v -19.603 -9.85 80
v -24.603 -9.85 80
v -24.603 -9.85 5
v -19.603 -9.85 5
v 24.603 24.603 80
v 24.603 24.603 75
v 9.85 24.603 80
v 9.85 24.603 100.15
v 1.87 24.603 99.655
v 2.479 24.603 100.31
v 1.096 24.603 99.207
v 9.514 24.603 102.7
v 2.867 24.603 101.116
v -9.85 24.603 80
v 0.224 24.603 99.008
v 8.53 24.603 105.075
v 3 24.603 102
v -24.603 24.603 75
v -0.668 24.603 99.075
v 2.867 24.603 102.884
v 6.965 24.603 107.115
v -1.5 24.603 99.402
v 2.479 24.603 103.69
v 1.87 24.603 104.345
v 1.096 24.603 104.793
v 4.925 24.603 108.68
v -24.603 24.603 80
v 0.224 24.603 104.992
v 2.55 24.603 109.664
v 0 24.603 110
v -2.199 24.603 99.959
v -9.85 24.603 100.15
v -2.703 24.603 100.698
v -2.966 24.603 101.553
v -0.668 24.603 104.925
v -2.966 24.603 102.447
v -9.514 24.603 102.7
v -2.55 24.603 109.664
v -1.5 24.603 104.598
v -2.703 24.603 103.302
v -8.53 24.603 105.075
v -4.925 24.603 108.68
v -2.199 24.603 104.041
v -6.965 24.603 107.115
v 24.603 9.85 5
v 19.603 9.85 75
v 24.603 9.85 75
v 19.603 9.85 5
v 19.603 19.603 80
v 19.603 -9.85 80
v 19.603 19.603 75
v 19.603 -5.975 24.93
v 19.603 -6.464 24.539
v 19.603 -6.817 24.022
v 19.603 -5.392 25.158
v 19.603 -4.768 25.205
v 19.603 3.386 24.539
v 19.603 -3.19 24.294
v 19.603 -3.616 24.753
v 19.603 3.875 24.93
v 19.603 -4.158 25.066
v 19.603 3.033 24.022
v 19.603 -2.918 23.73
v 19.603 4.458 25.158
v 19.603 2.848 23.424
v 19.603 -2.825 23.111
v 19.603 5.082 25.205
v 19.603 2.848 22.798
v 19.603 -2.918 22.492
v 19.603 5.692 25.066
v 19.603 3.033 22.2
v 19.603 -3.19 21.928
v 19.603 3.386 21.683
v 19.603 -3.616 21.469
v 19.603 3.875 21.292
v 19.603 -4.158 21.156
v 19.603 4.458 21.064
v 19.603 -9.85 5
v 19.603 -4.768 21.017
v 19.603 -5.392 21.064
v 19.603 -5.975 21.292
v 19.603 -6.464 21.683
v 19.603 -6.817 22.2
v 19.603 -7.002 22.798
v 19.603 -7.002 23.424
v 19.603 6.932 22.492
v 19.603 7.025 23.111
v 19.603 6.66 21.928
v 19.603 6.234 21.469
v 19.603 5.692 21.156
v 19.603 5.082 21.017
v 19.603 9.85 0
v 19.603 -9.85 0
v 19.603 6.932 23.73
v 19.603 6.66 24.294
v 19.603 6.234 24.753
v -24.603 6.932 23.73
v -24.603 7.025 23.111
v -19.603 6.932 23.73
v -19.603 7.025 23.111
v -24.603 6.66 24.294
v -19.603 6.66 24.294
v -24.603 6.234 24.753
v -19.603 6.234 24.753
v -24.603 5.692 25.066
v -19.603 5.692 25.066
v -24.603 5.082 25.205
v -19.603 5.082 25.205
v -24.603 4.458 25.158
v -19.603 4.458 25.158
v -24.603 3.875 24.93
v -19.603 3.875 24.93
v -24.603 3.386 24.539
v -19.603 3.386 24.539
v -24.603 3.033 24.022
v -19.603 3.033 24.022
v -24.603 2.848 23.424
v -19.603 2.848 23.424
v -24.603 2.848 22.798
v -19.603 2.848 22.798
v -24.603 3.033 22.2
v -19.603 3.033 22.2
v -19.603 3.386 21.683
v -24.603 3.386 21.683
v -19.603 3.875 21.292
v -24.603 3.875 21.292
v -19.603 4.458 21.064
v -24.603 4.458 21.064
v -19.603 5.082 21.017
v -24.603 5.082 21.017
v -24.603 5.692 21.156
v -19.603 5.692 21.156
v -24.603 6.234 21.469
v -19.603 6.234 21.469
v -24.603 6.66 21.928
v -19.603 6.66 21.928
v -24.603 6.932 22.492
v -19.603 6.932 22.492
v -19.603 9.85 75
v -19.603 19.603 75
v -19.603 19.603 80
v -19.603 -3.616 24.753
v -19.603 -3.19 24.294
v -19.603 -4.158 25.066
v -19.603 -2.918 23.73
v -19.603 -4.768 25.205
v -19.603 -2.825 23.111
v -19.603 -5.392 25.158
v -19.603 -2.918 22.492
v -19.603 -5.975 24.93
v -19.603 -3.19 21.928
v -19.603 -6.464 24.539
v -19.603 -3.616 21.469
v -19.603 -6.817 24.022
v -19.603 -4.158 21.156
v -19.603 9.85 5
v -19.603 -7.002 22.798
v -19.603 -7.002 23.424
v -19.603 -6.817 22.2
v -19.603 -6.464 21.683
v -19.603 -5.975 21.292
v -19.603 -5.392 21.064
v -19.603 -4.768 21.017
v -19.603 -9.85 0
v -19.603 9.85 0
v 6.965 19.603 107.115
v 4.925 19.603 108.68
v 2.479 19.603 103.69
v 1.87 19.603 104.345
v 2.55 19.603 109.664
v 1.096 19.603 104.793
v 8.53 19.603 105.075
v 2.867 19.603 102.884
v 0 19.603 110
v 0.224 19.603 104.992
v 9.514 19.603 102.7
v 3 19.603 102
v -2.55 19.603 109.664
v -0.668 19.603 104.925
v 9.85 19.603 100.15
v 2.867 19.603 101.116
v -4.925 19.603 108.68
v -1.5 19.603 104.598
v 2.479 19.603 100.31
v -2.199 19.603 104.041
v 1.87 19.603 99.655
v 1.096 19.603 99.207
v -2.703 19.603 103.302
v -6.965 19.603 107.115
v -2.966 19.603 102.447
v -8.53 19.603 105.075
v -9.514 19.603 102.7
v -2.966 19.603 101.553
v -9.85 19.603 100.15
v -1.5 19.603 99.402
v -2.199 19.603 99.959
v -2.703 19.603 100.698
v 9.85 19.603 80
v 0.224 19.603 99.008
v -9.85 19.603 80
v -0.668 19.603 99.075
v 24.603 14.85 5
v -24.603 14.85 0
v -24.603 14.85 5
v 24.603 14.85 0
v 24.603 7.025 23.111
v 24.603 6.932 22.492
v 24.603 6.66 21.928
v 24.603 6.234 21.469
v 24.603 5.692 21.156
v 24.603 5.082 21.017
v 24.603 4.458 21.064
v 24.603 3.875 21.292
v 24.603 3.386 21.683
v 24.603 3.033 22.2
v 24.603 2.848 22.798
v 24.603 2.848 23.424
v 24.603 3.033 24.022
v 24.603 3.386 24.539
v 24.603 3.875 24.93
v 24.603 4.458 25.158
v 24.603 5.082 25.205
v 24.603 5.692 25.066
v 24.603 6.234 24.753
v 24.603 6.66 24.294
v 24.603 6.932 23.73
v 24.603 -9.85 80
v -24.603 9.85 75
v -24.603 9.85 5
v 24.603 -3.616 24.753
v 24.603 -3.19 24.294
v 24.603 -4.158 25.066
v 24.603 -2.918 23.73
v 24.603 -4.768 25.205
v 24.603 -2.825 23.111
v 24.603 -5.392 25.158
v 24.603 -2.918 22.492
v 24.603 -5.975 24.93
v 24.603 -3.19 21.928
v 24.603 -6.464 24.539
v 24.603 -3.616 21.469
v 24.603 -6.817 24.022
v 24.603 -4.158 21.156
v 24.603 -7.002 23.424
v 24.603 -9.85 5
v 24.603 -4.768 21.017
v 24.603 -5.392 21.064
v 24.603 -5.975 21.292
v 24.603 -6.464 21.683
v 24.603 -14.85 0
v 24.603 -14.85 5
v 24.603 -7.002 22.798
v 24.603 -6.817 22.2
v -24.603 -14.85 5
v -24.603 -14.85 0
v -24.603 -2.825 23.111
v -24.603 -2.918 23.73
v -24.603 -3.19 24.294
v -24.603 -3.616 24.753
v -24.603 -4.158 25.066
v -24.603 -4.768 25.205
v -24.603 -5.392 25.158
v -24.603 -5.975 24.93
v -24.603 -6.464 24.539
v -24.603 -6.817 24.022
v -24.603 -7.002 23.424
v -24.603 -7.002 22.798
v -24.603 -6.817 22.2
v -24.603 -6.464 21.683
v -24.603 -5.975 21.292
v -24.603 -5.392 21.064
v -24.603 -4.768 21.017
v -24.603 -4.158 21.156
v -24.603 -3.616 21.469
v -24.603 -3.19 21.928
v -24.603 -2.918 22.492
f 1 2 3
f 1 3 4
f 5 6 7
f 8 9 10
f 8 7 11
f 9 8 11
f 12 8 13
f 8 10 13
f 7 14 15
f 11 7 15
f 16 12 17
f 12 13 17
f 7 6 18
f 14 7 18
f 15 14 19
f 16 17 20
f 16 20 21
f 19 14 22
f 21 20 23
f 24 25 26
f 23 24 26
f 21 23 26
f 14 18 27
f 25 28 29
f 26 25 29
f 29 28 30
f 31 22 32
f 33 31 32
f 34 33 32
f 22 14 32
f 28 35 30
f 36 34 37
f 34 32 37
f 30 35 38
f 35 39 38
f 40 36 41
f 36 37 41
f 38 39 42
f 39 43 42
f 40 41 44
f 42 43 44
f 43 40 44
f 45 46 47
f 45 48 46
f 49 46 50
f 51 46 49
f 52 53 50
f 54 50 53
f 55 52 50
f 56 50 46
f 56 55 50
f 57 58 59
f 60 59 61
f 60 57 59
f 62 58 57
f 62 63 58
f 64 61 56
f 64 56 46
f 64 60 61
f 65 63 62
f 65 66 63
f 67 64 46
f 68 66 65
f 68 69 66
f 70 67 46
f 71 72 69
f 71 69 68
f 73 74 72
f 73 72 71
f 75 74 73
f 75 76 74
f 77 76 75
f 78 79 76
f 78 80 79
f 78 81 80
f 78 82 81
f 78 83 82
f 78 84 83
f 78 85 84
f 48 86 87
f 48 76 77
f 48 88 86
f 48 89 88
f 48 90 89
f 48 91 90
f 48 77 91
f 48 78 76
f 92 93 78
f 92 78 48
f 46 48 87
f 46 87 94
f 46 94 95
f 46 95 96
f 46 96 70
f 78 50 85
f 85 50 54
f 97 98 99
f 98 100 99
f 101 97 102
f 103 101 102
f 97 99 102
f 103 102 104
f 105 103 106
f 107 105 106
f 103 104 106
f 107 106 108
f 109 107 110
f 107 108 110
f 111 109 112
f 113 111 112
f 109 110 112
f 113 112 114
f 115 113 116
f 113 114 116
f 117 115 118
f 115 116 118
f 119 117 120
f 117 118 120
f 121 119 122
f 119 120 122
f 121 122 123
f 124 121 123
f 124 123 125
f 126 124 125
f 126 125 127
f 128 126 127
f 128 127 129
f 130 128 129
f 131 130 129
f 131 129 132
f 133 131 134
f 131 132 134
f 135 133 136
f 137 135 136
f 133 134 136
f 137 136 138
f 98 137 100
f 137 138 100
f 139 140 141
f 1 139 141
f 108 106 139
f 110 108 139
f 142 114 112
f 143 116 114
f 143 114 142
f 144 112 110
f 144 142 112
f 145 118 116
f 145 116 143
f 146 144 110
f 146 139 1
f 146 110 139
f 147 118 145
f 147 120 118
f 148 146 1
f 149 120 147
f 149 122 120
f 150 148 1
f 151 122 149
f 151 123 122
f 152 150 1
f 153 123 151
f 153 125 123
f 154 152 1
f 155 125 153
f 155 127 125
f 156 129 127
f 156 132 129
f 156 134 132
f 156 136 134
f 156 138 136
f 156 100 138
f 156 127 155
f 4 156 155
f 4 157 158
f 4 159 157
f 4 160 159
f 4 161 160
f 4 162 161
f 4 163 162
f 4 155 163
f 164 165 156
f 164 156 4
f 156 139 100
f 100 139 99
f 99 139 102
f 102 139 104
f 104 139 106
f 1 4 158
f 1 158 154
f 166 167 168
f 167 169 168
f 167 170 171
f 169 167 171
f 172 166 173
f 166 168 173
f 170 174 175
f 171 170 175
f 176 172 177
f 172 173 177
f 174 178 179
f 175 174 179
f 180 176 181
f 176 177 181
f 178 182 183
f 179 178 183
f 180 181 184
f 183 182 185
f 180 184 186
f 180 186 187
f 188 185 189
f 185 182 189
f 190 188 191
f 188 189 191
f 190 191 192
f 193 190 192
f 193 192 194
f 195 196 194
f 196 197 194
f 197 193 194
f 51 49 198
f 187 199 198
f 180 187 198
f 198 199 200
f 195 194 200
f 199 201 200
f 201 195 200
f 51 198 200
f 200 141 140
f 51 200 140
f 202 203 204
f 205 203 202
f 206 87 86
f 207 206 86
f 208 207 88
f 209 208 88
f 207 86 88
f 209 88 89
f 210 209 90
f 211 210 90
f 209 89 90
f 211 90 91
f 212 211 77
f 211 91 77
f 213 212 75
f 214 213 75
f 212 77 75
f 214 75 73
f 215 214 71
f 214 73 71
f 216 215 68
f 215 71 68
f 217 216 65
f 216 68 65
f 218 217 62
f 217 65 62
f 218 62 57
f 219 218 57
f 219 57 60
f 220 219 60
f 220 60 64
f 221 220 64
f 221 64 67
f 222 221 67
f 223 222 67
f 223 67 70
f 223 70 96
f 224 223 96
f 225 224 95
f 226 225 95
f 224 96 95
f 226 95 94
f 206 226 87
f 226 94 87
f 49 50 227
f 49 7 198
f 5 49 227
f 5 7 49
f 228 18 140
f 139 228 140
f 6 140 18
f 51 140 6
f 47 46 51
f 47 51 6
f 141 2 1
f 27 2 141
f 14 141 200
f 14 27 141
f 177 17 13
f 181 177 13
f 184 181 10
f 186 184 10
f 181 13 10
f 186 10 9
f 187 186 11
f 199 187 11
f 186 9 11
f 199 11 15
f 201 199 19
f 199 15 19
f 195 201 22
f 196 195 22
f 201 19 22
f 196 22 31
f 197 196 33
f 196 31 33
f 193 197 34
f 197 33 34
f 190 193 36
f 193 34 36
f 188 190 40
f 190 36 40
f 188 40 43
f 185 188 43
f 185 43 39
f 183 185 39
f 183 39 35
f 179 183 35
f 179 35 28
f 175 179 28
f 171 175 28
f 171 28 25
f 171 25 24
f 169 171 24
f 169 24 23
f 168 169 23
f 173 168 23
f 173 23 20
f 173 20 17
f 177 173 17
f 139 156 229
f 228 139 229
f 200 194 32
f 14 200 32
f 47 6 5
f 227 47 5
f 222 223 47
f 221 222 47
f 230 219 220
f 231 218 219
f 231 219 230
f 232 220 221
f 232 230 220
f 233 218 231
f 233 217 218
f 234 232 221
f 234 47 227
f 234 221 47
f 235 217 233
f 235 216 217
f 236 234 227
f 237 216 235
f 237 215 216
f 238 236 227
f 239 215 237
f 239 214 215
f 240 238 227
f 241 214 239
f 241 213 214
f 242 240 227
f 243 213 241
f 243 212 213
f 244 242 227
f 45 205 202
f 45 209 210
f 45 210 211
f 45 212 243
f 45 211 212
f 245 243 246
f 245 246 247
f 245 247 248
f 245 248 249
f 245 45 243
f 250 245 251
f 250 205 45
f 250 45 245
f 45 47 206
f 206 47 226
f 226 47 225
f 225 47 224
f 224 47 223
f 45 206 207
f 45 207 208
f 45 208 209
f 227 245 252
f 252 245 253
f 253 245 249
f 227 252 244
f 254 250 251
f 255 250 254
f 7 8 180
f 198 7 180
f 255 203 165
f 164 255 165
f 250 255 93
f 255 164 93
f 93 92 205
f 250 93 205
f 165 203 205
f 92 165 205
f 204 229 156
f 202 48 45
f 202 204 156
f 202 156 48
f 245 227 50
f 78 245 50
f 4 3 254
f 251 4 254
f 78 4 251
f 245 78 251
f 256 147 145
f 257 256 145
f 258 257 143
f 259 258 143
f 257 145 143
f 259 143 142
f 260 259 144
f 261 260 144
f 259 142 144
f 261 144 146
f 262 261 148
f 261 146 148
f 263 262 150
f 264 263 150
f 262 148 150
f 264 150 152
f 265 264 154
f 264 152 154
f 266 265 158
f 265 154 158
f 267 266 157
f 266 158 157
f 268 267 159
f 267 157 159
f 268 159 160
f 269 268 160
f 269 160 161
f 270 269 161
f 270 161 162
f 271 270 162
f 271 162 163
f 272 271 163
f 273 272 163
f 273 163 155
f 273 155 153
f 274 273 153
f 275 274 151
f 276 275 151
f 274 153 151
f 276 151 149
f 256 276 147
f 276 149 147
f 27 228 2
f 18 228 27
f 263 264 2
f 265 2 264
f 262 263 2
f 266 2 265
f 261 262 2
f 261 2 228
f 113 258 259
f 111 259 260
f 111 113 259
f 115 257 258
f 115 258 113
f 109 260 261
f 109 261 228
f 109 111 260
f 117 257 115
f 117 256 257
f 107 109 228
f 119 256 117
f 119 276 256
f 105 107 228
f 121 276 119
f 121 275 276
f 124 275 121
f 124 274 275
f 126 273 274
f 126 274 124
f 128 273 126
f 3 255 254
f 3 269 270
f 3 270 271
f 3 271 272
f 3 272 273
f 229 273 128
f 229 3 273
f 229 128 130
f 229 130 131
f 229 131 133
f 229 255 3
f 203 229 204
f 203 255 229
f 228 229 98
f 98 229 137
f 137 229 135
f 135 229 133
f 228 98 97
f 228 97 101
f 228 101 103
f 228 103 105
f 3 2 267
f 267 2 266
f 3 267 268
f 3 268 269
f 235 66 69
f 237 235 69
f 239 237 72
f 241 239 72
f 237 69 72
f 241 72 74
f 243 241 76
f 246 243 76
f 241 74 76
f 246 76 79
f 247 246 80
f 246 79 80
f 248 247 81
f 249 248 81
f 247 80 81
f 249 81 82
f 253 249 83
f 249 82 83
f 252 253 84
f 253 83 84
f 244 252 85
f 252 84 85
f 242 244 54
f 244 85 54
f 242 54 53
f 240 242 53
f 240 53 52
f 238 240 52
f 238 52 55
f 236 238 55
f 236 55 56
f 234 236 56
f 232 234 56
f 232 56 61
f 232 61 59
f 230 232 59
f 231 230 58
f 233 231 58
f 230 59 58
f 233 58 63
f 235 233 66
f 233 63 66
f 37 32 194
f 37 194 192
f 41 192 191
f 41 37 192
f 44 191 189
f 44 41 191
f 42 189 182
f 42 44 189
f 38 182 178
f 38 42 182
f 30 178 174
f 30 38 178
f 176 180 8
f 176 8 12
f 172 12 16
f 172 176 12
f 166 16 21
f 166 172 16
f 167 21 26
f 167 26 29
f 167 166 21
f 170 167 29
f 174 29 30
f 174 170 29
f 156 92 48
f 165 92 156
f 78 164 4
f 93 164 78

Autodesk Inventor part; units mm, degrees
ref_plane "YZ Plane" through (0, 0, 0) normal (1, 0, 0) x (0, 1, 0)
ref_plane "XZ Plane" through (0, 0, 0) normal (0, 1, 0) x (-1, 0, 0)
ref_plane "XY Plane" through (0, 0, 0) normal (0, 0, 1) x (1, 0, 0)
sketch "Sketch1" plane through (0, 0, 0) normal (0, 0, 1) x (1, 0, 0)
  line L0 (-19.603, -9.85) -> (19.603, -9.85)
  line L1 (19.603, -9.85) -> (19.603, 9.85)
  line L2 (19.603, 9.85) -> (-19.603, 9.85)
  line L3 (-19.603, 9.85) -> (-19.603, -9.85)
  line L4 (-19.603, -9.85) -> (19.603, 9.85) construction
  line L5 (19.603, -9.85) -> (-19.603, 9.85) construction
  line L6 (-24.603, 14.85) -> (24.603, 14.85)
  line L7 (24.603, 14.85) -> (24.603, -14.85)
  line L8 (24.603, -14.85) -> (-24.603, -14.85)
  line L9 (-24.603, -14.85) -> (-24.603, 14.85)
  point P0 (0, 0)
  dimension "d0" = 39.206
  dimension "d1" = 19.7
  dimension "d2" = 5
extrude "Extrusion1" add sketch "Sketch1" along normal blind 5
sketch "Sketch2" plane through (0, 0, 5) normal (0, 0, 1) x (1, 0, 0)
  line L0 (-24.603, 14.85) -> (-24.603, -14.85) construction
  line L1 (-24.603, 14.85) -> (-24.603, -14.85) construction
  line L2 (24.603, 14.85) -> (-24.603, 14.85) construction
  line L3 (-24.603, 14.85) -> (24.603, 14.85) construction
  line L4 (24.603, -14.85) -> (24.603, 14.85) construction
  line L5 (24.603, 14.85) -> (24.603, -14.85) construction
  line L6 (24.603, -14.85) -> (-24.603, -14.85) construction
  line L7 (-19.603, -9.85) -> (-19.603, 9.85) projected
  line L8 (-19.603, 9.85) -> (-24.603, 9.85)
  line L9 (-24.603, 9.85) -> (-24.603, -9.85)
  line L10 (-24.603, -9.85) -> (-19.603, -9.85)
  line L11 (-19.603, -9.85) -> (-19.603, 9.85)
  line L12 (19.603, 9.85) -> (19.603, -9.85) projected
  line L13 (19.603, 9.85) -> (24.603, 9.85)
  line L14 (24.603, 9.85) -> (24.603, -9.85)
  line L15 (24.603, -9.85) -> (19.603, -9.85)
  line L16 (19.603, -9.85) -> (19.603, 9.85)
  point P0 (0, 0)
extrude "Extrusion2" add sketch "Sketch2" along normal blind 75
sketch "Sketch3" plane through (0, 0, 0) normal (1, 0, 0) x (0, 1, 0)
  circle A0 centre (4.925, 23.111) radius 2.1
  line L0 (14.85, 0) -> (14.85, 5) projected
  line L1 (14.85, 5) -> (9.85, 5) projected
  circle A1 centre (-4.925, 23.111) radius 2.1
  line L2 (-14.85, 0) -> (-14.85, 5) projected
  line L3 (-9.85, 5) -> (-14.85, 5) projected
  point P0 (0, 0)
  point P1 (-12.35, 5)
  dimension "d7" = 4.2
  dimension "d8" = 9.925
  dimension "d9" = 18.111
  dimension "d10" = 4.2
  dimension "d11" = 9.925
  dimension "d12" = 18.111
extrude "Extrusion3" cut sketch "Sketch3" along normal through all both and the other way through all
sketch "Sketch4" plane through (0, 0, 0) normal (1, 0, 0) x (0, 1, 0)
  line L0 (-9.85, 80) -> (9.85, 80) construction
  line L1 (0, 80) -> (0, 0) construction
  line L2 (24.603, 80) -> (19.603, 80)
  line L3 (19.603, 80) -> (19.603, 75)
  line L4 (19.603, 75) -> (24.603, 75)
  line L5 (24.603, 75) -> (24.603, 80)
  line L6 (14.85, 0) -> (-14.85, 0) projected
  point P0 (19.603, 77.5)
  dimension "d29" = 5
  dimension "d30" = 5
  dimension "d31" = 19.603
  dimension "d32" = 75
extrude "Extrusion4" add sketch "Sketch4" along normal mid plane 49.206
sketch "Sketch5" plane through (0, 0, 80) normal (0, 0, 1) x (1, 0, 0)
  line L0 (-24.603, -9.85) -> (-24.603, 14.85) projected
  line L1 (24.603, -9.85) -> (24.603, 14.85) projected
  line L2 (-24.603, 24.603) -> (24.603, 24.603) projected
  line L3 (-9.85, 24.603) -> (9.85, 24.603)
  line L4 (9.85, 24.603) -> (9.85, 19.603)
  line L5 (9.85, 19.603) -> (-9.85, 19.603)
  line L6 (-9.85, 19.603) -> (-9.85, 24.603)
  line L7 (24.603, 24.603) -> (24.603, 19.603) projected
  line L8 (-24.603, 19.603) -> (-24.603, 24.603) projected
  point P0 (0, 0)
  point P1 (9.85, 22.103)
  point P2 (-24.603, 22.103)
  point P3 (9.85, 24.603)
  dimension "d33" = 19.7
  dimension "d34" = 5
  dimension "d35" = 14.753
  dimension "d36" = 14.753
extrude "Extrusion5" add sketch "Sketch5" along normal blind 30
sketch "Sketch7" plane through (19.603, 9.85, 5) normal (0, 1, 0) x (1, 0, 0)
  line L0 (-39.206, 0) -> (-39.206, -75) projected
  line L1 (-39.206, -75) -> (-44.206, -75)
  line L2 (-44.206, -75) -> (-44.206, -70)
  line L3 (-44.206, -70) -> (-39.206, -70)
  line L4 (-39.206, -70) -> (-39.206, -75)
  line L5 (0, 0) -> (0, -75) projected
  line L6 (0, -75) -> (5, -75)
  line L7 (5, -75) -> (5, -70)
  line L8 (5, -70) -> (0, -70)
  line L9 (0, -70) -> (0, -75)
  point P0 (-19.603, 5)
  point P1 (-39.206, -70)
  point P2 (0, -70)
  dimension "d37" = 5
  dimension "d38" = 5
  dimension "d39" = 5
  dimension "d40" = 5
extrude "Extrusion7" add sketch "Sketch7" along normal through all
sketch "Sketch8" plane through (-24.603, 24.603, 75) normal (0, 1, 0) x (1, 0, 0)
  line L0 (14.753, -35) -> (34.453, -35) construction
  line L1 (24.603, -35) -> (24.603, 0) construction
  line L2 (5, 0) -> (44.206, 0) construction
  circle A0 centre (24.603, -27) radius 3
  point P0 (24.603, 75)
  point P1 (0, 0)
  point P2 (49.206, 0)
  dimension "d43" = 6
  dimension "d44" = 8
extrude "Extrusion8" cut sketch "Sketch8" against normal through all
fillet "Fillet1" radius 9.85 2 edges at (9.85, 22.103, 110) (-9.85, 22.103, 110)
properties part number "Part2_cage"
